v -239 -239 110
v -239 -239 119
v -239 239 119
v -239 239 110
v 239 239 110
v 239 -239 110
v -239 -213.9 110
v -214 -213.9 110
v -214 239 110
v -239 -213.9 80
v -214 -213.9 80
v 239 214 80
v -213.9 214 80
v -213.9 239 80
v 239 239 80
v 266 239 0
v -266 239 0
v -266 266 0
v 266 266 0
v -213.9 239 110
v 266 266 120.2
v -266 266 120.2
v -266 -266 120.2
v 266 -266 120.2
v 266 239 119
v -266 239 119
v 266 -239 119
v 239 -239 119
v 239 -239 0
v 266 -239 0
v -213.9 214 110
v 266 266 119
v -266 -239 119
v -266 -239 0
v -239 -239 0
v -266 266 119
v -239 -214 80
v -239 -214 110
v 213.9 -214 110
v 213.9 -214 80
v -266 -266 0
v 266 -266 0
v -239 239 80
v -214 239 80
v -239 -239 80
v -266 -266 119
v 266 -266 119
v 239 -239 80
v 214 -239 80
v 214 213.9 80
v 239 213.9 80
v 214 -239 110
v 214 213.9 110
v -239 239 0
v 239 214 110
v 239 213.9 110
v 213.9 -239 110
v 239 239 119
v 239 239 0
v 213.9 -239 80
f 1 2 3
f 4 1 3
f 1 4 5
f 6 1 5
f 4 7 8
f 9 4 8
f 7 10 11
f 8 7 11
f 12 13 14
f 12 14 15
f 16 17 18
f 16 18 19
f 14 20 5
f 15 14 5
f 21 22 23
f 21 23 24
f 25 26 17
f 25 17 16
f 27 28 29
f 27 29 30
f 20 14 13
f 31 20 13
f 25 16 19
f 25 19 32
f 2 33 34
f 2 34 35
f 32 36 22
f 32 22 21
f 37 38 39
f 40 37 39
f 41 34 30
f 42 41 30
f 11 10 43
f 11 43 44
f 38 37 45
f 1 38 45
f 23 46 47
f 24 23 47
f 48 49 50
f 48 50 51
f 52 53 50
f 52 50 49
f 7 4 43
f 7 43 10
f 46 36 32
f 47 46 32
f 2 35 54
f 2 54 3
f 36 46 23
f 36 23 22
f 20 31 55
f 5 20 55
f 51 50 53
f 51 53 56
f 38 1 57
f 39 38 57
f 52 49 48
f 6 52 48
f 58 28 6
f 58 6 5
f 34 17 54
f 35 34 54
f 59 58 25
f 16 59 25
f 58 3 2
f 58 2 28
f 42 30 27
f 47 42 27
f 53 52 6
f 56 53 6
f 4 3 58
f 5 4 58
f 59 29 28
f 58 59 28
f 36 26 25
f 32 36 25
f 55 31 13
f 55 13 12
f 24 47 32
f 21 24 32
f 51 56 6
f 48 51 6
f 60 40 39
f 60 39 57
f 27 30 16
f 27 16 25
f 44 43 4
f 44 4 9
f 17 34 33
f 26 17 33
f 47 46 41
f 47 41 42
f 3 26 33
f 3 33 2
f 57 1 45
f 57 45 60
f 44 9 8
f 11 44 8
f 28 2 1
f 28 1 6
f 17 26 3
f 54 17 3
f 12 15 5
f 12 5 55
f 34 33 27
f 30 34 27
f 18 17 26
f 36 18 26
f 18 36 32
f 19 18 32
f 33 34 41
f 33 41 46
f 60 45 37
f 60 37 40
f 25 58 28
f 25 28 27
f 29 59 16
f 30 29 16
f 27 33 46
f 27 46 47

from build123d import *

# Parameters (mm, degrees)
F0_W      = 27
F0_H      = 119
F1_DEPTH  = 239
F2_W      = 532
F2_H      = 119
F3_DEPTH  = 27
F5_W      = 478
F5_H      = 478
F6_DEPTH  = 9
F7_W      = 25
F7_H      = 452.9
F8_DEPTH  = 30
F7_W_2    = 452.9
F7_H_2    = 25
F9_W      = 532
F9_H      = 532
F10_DEPTH = 1.2


with BuildPart() as f1:
    # F0 (on Front) → F1 (new body, symmetric)
    with BuildSketch(Plane.XZ):
        with Locations((-252.5, 59.5)):
            Rectangle(F0_W, F0_H)
    extrude(amount=F1_DEPTH, both=True)


with BuildPart() as f1b:
    # F0 (on Front) → F1, piece 2 (new body, symmetric)
    with BuildSketch(Plane.XZ):
        with Locations((252.5, 59.5)):
            Rectangle(F0_W, F0_H)
    extrude(amount=F1_DEPTH, both=True)


with BuildPart() as f3:
    # F2 (on face) → F3 (new body)
    with BuildSketch(Plane.XZ.offset(239)):
        with Locations((0, 59.5)):
            Rectangle(F2_W, F2_H)
    extrude(amount=F3_DEPTH)


with BuildPart() as f4_1:
    # F4: instance of F3
    add(f3.part.mirror(Plane.XZ))


with BuildPart() as f6:
    # F5 (on face) → F6 (new body)
    with BuildSketch(Plane.XY.offset(119)):
        Rectangle(F5_W, F5_H)
    extrude(amount=-F6_DEPTH)


with BuildPart() as f8:
    # F7 (on face) → F8 (new body)
    with BuildSketch(Plane(origin=(0, 0, 110), x_dir=(1, 0, 0), z_dir=(0, 0, -1))):
        with Locations((-226.5, -12.55)):
            Rectangle(F7_W, F7_H)
    extrude(amount=F8_DEPTH)


with BuildPart() as f8b:
    # F7 (on face) → F8, piece 2 (new body)
    with BuildSketch(Plane(origin=(0, 0, 110), x_dir=(1, 0, 0), z_dir=(0, 0, -1))):
        with Locations((12.55, -226.5)):
            Rectangle(F7_W_2, F7_H_2)
    extrude(amount=F8_DEPTH)


with BuildPart() as f8c:
    # F7 (on face) → F8, piece 3 (new body)
    with BuildSketch(Plane(origin=(0, 0, 110), x_dir=(1, 0, 0), z_dir=(0, 0, -1))):
        with Locations((226.5, 12.55)):
            Rectangle(F7_W, F7_H)
    extrude(amount=F8_DEPTH)


with BuildPart() as f8d:
    # F7 (on face) → F8, piece 4 (new body)
    with BuildSketch(Plane(origin=(0, 0, 110), x_dir=(1, 0, 0), z_dir=(0, 0, -1))):
        with Locations((-12.55, 226.5)):
            Rectangle(F7_W_2, F7_H_2)
    extrude(amount=F8_DEPTH)


with BuildPart() as f10:
    # F9 (on face) → F10 (new body)
    with BuildSketch(Plane.XY.offset(119)):
        Rectangle(F9_W, F9_H)
    extrude(amount=F10_DEPTH)


solid = Compound([f1.part, f1b.part, f3.part, f4_1.part, f6.part, f8.part, f8b.part, f8c.part, f8d.part, f10.part])
